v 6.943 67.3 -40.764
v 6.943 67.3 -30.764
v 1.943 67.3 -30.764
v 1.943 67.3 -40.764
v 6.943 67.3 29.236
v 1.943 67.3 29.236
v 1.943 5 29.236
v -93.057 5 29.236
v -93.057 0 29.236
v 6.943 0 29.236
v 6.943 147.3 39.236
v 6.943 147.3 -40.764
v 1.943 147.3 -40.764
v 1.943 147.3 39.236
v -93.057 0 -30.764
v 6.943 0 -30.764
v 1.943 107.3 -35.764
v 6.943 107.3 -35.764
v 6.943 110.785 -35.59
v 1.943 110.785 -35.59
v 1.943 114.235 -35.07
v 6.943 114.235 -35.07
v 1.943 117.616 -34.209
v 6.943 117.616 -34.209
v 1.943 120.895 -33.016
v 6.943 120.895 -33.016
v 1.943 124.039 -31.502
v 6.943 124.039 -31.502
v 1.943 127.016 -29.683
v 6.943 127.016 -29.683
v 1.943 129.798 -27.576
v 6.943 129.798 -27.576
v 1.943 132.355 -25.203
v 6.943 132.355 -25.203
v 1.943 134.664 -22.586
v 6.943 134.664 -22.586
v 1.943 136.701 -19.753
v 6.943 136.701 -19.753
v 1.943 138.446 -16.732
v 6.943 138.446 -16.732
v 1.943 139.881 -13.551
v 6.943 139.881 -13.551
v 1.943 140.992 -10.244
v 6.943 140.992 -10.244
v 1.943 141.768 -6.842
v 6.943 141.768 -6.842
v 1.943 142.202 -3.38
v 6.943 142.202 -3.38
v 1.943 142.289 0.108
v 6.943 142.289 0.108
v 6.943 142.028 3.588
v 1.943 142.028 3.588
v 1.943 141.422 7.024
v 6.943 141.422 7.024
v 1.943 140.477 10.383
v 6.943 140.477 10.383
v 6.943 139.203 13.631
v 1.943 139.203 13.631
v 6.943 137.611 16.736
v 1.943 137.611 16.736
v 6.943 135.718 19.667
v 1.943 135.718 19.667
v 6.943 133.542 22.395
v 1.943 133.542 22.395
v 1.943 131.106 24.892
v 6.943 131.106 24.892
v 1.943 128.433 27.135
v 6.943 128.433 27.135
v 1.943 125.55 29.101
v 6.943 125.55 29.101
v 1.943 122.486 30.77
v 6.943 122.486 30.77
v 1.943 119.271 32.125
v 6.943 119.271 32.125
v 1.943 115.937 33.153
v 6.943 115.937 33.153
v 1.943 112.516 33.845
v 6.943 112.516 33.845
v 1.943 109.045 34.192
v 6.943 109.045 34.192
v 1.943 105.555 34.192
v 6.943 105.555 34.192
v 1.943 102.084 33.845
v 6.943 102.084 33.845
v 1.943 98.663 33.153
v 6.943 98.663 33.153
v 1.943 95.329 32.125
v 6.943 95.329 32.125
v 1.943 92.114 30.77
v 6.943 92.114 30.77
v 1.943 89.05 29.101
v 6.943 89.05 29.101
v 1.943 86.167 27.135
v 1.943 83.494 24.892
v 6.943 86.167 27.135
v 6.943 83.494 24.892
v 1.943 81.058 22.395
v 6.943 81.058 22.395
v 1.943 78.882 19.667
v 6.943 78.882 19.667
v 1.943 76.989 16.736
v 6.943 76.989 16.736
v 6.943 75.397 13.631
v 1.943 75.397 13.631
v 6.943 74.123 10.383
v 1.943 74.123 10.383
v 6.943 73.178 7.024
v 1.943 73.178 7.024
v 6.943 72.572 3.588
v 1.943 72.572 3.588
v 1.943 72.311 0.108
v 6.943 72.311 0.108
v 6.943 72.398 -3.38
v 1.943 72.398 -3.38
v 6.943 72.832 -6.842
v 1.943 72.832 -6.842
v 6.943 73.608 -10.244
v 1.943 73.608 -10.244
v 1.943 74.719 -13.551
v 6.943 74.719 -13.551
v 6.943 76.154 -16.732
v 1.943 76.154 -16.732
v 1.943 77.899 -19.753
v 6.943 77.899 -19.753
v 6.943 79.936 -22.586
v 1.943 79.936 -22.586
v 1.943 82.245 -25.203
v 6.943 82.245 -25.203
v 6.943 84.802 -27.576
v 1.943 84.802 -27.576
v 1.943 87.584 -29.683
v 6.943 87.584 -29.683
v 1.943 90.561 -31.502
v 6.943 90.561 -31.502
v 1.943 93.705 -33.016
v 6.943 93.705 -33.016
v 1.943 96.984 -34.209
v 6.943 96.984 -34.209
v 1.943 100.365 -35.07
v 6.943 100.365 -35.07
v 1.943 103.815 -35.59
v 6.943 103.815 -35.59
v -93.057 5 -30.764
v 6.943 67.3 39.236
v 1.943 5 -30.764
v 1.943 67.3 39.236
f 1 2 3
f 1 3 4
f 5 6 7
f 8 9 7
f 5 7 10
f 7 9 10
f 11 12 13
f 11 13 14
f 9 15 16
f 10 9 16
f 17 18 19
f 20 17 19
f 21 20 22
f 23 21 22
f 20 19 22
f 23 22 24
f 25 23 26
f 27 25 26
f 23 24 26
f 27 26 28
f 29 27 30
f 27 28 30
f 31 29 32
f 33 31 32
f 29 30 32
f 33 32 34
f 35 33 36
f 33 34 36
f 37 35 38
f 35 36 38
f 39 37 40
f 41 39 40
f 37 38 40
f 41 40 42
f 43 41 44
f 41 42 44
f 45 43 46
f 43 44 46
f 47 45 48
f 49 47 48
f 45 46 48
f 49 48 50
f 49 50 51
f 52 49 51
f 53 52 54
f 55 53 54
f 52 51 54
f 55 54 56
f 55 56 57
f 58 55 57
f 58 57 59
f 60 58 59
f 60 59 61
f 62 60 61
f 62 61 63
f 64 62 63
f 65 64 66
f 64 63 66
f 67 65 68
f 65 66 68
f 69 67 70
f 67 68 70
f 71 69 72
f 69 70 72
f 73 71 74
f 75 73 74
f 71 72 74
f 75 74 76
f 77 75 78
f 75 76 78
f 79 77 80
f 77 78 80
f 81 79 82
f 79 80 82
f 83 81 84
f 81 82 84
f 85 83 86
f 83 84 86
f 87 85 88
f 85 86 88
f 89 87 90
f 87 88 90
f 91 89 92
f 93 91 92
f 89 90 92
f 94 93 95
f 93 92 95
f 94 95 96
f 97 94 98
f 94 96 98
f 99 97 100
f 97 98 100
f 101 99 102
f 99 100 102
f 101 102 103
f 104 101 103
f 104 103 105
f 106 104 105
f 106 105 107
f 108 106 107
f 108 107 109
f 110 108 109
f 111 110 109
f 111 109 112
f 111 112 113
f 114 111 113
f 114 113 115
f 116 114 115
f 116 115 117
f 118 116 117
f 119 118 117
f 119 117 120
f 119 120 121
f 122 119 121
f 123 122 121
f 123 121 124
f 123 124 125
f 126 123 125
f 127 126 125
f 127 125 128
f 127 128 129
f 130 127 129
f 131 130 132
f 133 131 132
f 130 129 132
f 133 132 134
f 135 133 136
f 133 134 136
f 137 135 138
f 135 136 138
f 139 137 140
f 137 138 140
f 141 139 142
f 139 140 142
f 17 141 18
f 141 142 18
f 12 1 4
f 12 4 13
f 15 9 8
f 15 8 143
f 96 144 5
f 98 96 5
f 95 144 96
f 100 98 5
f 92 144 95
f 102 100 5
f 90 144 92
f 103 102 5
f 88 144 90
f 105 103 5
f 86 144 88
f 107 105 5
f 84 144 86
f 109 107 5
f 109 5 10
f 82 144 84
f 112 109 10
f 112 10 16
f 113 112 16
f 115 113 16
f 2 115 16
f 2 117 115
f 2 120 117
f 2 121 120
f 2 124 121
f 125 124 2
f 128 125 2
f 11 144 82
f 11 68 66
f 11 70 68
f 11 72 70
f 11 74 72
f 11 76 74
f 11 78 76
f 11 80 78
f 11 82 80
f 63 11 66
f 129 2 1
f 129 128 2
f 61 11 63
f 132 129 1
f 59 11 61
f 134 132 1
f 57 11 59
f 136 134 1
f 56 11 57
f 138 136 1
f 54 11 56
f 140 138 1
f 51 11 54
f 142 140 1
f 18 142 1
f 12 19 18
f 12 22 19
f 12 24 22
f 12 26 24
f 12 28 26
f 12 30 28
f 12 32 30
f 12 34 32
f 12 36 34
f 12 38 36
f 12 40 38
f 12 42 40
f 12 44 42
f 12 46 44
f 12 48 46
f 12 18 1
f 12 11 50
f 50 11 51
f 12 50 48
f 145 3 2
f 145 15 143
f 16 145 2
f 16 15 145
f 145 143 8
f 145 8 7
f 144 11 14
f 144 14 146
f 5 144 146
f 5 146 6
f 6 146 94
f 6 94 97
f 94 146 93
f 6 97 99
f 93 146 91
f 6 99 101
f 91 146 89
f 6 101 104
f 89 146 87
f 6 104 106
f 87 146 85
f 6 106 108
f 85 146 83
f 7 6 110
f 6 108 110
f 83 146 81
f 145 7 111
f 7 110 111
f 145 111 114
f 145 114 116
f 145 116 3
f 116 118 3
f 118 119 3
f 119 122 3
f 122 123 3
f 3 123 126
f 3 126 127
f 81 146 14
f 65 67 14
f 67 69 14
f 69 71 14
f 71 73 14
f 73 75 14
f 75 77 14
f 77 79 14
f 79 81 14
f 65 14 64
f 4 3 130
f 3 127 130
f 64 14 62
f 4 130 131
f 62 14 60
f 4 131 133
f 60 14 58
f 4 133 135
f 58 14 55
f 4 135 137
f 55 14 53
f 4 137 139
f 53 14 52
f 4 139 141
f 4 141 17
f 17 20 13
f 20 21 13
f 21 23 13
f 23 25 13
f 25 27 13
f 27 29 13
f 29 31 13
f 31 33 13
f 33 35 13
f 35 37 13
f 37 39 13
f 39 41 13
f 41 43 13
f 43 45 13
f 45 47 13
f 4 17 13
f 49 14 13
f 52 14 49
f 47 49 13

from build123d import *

# Parameters (mm, degrees)
SKETCH1_W           = 100
SKETCH1_H           = 60
BOSS_EXTRUDE1_DEPTH = 5
SKETCH2_W           = 5
SKETCH2_H           = 60
BOSS_EXTRUDE2_DEPTH = 62.3
BOSS_EXTRUDE3_DEPTH = 5
SKETCH5_R           = 35
CUT_EXTRUDE1_DEPTH  = 5


with BuildPart() as part:
    # Sketch1 → Boss-Extrude1 (new body)
    with BuildSketch(Plane(origin=(0, 0, 0), x_dir=(1, 0, 0), z_dir=(0, 1, 0))):
        with Locations((-43.057324841, 0.76433121)):
            Rectangle(SKETCH1_W, SKETCH1_H)
    extrude(amount=BOSS_EXTRUDE1_DEPTH)

    # Sketch2 → Boss-Extrude2 (add)
    with BuildSketch(Plane(origin=(0, 5, 0), x_dir=(1, 0, 0), z_dir=(0, 1, 0))):
        with Locations((4.442675159, 0.76433121)):
            Rectangle(SKETCH2_W, SKETCH2_H)
    extrude(amount=BOSS_EXTRUDE2_DEPTH)

    # Sketch4 → Boss-Extrude3 (add)
    with BuildSketch(Plane(origin=(6.942675159, 0, 0), x_dir=(0, 0, -1), z_dir=(1, 0, 0))):
        Polygon((-29.23566879, 67.3), (40.76433121, 67.3), (40.76433121, 147.3), (-39.23566879, 147.3), (-39.23566879, 67.3), align=None)
    extrude(amount=-BOSS_EXTRUDE3_DEPTH)

    # Sketch5 → Cut-Extrude1 (cut)
    with BuildSketch(Plane(origin=(6.942675159, 0, 0), x_dir=(0, 0, -1), z_dir=(1, 0, 0))):
        with Locations((0.76433121, 107.3)):
            Circle(SKETCH5_R)
    extrude(amount=-CUT_EXTRUDE1_DEPTH, mode=Mode.SUBTRACT)


solid = part.part
